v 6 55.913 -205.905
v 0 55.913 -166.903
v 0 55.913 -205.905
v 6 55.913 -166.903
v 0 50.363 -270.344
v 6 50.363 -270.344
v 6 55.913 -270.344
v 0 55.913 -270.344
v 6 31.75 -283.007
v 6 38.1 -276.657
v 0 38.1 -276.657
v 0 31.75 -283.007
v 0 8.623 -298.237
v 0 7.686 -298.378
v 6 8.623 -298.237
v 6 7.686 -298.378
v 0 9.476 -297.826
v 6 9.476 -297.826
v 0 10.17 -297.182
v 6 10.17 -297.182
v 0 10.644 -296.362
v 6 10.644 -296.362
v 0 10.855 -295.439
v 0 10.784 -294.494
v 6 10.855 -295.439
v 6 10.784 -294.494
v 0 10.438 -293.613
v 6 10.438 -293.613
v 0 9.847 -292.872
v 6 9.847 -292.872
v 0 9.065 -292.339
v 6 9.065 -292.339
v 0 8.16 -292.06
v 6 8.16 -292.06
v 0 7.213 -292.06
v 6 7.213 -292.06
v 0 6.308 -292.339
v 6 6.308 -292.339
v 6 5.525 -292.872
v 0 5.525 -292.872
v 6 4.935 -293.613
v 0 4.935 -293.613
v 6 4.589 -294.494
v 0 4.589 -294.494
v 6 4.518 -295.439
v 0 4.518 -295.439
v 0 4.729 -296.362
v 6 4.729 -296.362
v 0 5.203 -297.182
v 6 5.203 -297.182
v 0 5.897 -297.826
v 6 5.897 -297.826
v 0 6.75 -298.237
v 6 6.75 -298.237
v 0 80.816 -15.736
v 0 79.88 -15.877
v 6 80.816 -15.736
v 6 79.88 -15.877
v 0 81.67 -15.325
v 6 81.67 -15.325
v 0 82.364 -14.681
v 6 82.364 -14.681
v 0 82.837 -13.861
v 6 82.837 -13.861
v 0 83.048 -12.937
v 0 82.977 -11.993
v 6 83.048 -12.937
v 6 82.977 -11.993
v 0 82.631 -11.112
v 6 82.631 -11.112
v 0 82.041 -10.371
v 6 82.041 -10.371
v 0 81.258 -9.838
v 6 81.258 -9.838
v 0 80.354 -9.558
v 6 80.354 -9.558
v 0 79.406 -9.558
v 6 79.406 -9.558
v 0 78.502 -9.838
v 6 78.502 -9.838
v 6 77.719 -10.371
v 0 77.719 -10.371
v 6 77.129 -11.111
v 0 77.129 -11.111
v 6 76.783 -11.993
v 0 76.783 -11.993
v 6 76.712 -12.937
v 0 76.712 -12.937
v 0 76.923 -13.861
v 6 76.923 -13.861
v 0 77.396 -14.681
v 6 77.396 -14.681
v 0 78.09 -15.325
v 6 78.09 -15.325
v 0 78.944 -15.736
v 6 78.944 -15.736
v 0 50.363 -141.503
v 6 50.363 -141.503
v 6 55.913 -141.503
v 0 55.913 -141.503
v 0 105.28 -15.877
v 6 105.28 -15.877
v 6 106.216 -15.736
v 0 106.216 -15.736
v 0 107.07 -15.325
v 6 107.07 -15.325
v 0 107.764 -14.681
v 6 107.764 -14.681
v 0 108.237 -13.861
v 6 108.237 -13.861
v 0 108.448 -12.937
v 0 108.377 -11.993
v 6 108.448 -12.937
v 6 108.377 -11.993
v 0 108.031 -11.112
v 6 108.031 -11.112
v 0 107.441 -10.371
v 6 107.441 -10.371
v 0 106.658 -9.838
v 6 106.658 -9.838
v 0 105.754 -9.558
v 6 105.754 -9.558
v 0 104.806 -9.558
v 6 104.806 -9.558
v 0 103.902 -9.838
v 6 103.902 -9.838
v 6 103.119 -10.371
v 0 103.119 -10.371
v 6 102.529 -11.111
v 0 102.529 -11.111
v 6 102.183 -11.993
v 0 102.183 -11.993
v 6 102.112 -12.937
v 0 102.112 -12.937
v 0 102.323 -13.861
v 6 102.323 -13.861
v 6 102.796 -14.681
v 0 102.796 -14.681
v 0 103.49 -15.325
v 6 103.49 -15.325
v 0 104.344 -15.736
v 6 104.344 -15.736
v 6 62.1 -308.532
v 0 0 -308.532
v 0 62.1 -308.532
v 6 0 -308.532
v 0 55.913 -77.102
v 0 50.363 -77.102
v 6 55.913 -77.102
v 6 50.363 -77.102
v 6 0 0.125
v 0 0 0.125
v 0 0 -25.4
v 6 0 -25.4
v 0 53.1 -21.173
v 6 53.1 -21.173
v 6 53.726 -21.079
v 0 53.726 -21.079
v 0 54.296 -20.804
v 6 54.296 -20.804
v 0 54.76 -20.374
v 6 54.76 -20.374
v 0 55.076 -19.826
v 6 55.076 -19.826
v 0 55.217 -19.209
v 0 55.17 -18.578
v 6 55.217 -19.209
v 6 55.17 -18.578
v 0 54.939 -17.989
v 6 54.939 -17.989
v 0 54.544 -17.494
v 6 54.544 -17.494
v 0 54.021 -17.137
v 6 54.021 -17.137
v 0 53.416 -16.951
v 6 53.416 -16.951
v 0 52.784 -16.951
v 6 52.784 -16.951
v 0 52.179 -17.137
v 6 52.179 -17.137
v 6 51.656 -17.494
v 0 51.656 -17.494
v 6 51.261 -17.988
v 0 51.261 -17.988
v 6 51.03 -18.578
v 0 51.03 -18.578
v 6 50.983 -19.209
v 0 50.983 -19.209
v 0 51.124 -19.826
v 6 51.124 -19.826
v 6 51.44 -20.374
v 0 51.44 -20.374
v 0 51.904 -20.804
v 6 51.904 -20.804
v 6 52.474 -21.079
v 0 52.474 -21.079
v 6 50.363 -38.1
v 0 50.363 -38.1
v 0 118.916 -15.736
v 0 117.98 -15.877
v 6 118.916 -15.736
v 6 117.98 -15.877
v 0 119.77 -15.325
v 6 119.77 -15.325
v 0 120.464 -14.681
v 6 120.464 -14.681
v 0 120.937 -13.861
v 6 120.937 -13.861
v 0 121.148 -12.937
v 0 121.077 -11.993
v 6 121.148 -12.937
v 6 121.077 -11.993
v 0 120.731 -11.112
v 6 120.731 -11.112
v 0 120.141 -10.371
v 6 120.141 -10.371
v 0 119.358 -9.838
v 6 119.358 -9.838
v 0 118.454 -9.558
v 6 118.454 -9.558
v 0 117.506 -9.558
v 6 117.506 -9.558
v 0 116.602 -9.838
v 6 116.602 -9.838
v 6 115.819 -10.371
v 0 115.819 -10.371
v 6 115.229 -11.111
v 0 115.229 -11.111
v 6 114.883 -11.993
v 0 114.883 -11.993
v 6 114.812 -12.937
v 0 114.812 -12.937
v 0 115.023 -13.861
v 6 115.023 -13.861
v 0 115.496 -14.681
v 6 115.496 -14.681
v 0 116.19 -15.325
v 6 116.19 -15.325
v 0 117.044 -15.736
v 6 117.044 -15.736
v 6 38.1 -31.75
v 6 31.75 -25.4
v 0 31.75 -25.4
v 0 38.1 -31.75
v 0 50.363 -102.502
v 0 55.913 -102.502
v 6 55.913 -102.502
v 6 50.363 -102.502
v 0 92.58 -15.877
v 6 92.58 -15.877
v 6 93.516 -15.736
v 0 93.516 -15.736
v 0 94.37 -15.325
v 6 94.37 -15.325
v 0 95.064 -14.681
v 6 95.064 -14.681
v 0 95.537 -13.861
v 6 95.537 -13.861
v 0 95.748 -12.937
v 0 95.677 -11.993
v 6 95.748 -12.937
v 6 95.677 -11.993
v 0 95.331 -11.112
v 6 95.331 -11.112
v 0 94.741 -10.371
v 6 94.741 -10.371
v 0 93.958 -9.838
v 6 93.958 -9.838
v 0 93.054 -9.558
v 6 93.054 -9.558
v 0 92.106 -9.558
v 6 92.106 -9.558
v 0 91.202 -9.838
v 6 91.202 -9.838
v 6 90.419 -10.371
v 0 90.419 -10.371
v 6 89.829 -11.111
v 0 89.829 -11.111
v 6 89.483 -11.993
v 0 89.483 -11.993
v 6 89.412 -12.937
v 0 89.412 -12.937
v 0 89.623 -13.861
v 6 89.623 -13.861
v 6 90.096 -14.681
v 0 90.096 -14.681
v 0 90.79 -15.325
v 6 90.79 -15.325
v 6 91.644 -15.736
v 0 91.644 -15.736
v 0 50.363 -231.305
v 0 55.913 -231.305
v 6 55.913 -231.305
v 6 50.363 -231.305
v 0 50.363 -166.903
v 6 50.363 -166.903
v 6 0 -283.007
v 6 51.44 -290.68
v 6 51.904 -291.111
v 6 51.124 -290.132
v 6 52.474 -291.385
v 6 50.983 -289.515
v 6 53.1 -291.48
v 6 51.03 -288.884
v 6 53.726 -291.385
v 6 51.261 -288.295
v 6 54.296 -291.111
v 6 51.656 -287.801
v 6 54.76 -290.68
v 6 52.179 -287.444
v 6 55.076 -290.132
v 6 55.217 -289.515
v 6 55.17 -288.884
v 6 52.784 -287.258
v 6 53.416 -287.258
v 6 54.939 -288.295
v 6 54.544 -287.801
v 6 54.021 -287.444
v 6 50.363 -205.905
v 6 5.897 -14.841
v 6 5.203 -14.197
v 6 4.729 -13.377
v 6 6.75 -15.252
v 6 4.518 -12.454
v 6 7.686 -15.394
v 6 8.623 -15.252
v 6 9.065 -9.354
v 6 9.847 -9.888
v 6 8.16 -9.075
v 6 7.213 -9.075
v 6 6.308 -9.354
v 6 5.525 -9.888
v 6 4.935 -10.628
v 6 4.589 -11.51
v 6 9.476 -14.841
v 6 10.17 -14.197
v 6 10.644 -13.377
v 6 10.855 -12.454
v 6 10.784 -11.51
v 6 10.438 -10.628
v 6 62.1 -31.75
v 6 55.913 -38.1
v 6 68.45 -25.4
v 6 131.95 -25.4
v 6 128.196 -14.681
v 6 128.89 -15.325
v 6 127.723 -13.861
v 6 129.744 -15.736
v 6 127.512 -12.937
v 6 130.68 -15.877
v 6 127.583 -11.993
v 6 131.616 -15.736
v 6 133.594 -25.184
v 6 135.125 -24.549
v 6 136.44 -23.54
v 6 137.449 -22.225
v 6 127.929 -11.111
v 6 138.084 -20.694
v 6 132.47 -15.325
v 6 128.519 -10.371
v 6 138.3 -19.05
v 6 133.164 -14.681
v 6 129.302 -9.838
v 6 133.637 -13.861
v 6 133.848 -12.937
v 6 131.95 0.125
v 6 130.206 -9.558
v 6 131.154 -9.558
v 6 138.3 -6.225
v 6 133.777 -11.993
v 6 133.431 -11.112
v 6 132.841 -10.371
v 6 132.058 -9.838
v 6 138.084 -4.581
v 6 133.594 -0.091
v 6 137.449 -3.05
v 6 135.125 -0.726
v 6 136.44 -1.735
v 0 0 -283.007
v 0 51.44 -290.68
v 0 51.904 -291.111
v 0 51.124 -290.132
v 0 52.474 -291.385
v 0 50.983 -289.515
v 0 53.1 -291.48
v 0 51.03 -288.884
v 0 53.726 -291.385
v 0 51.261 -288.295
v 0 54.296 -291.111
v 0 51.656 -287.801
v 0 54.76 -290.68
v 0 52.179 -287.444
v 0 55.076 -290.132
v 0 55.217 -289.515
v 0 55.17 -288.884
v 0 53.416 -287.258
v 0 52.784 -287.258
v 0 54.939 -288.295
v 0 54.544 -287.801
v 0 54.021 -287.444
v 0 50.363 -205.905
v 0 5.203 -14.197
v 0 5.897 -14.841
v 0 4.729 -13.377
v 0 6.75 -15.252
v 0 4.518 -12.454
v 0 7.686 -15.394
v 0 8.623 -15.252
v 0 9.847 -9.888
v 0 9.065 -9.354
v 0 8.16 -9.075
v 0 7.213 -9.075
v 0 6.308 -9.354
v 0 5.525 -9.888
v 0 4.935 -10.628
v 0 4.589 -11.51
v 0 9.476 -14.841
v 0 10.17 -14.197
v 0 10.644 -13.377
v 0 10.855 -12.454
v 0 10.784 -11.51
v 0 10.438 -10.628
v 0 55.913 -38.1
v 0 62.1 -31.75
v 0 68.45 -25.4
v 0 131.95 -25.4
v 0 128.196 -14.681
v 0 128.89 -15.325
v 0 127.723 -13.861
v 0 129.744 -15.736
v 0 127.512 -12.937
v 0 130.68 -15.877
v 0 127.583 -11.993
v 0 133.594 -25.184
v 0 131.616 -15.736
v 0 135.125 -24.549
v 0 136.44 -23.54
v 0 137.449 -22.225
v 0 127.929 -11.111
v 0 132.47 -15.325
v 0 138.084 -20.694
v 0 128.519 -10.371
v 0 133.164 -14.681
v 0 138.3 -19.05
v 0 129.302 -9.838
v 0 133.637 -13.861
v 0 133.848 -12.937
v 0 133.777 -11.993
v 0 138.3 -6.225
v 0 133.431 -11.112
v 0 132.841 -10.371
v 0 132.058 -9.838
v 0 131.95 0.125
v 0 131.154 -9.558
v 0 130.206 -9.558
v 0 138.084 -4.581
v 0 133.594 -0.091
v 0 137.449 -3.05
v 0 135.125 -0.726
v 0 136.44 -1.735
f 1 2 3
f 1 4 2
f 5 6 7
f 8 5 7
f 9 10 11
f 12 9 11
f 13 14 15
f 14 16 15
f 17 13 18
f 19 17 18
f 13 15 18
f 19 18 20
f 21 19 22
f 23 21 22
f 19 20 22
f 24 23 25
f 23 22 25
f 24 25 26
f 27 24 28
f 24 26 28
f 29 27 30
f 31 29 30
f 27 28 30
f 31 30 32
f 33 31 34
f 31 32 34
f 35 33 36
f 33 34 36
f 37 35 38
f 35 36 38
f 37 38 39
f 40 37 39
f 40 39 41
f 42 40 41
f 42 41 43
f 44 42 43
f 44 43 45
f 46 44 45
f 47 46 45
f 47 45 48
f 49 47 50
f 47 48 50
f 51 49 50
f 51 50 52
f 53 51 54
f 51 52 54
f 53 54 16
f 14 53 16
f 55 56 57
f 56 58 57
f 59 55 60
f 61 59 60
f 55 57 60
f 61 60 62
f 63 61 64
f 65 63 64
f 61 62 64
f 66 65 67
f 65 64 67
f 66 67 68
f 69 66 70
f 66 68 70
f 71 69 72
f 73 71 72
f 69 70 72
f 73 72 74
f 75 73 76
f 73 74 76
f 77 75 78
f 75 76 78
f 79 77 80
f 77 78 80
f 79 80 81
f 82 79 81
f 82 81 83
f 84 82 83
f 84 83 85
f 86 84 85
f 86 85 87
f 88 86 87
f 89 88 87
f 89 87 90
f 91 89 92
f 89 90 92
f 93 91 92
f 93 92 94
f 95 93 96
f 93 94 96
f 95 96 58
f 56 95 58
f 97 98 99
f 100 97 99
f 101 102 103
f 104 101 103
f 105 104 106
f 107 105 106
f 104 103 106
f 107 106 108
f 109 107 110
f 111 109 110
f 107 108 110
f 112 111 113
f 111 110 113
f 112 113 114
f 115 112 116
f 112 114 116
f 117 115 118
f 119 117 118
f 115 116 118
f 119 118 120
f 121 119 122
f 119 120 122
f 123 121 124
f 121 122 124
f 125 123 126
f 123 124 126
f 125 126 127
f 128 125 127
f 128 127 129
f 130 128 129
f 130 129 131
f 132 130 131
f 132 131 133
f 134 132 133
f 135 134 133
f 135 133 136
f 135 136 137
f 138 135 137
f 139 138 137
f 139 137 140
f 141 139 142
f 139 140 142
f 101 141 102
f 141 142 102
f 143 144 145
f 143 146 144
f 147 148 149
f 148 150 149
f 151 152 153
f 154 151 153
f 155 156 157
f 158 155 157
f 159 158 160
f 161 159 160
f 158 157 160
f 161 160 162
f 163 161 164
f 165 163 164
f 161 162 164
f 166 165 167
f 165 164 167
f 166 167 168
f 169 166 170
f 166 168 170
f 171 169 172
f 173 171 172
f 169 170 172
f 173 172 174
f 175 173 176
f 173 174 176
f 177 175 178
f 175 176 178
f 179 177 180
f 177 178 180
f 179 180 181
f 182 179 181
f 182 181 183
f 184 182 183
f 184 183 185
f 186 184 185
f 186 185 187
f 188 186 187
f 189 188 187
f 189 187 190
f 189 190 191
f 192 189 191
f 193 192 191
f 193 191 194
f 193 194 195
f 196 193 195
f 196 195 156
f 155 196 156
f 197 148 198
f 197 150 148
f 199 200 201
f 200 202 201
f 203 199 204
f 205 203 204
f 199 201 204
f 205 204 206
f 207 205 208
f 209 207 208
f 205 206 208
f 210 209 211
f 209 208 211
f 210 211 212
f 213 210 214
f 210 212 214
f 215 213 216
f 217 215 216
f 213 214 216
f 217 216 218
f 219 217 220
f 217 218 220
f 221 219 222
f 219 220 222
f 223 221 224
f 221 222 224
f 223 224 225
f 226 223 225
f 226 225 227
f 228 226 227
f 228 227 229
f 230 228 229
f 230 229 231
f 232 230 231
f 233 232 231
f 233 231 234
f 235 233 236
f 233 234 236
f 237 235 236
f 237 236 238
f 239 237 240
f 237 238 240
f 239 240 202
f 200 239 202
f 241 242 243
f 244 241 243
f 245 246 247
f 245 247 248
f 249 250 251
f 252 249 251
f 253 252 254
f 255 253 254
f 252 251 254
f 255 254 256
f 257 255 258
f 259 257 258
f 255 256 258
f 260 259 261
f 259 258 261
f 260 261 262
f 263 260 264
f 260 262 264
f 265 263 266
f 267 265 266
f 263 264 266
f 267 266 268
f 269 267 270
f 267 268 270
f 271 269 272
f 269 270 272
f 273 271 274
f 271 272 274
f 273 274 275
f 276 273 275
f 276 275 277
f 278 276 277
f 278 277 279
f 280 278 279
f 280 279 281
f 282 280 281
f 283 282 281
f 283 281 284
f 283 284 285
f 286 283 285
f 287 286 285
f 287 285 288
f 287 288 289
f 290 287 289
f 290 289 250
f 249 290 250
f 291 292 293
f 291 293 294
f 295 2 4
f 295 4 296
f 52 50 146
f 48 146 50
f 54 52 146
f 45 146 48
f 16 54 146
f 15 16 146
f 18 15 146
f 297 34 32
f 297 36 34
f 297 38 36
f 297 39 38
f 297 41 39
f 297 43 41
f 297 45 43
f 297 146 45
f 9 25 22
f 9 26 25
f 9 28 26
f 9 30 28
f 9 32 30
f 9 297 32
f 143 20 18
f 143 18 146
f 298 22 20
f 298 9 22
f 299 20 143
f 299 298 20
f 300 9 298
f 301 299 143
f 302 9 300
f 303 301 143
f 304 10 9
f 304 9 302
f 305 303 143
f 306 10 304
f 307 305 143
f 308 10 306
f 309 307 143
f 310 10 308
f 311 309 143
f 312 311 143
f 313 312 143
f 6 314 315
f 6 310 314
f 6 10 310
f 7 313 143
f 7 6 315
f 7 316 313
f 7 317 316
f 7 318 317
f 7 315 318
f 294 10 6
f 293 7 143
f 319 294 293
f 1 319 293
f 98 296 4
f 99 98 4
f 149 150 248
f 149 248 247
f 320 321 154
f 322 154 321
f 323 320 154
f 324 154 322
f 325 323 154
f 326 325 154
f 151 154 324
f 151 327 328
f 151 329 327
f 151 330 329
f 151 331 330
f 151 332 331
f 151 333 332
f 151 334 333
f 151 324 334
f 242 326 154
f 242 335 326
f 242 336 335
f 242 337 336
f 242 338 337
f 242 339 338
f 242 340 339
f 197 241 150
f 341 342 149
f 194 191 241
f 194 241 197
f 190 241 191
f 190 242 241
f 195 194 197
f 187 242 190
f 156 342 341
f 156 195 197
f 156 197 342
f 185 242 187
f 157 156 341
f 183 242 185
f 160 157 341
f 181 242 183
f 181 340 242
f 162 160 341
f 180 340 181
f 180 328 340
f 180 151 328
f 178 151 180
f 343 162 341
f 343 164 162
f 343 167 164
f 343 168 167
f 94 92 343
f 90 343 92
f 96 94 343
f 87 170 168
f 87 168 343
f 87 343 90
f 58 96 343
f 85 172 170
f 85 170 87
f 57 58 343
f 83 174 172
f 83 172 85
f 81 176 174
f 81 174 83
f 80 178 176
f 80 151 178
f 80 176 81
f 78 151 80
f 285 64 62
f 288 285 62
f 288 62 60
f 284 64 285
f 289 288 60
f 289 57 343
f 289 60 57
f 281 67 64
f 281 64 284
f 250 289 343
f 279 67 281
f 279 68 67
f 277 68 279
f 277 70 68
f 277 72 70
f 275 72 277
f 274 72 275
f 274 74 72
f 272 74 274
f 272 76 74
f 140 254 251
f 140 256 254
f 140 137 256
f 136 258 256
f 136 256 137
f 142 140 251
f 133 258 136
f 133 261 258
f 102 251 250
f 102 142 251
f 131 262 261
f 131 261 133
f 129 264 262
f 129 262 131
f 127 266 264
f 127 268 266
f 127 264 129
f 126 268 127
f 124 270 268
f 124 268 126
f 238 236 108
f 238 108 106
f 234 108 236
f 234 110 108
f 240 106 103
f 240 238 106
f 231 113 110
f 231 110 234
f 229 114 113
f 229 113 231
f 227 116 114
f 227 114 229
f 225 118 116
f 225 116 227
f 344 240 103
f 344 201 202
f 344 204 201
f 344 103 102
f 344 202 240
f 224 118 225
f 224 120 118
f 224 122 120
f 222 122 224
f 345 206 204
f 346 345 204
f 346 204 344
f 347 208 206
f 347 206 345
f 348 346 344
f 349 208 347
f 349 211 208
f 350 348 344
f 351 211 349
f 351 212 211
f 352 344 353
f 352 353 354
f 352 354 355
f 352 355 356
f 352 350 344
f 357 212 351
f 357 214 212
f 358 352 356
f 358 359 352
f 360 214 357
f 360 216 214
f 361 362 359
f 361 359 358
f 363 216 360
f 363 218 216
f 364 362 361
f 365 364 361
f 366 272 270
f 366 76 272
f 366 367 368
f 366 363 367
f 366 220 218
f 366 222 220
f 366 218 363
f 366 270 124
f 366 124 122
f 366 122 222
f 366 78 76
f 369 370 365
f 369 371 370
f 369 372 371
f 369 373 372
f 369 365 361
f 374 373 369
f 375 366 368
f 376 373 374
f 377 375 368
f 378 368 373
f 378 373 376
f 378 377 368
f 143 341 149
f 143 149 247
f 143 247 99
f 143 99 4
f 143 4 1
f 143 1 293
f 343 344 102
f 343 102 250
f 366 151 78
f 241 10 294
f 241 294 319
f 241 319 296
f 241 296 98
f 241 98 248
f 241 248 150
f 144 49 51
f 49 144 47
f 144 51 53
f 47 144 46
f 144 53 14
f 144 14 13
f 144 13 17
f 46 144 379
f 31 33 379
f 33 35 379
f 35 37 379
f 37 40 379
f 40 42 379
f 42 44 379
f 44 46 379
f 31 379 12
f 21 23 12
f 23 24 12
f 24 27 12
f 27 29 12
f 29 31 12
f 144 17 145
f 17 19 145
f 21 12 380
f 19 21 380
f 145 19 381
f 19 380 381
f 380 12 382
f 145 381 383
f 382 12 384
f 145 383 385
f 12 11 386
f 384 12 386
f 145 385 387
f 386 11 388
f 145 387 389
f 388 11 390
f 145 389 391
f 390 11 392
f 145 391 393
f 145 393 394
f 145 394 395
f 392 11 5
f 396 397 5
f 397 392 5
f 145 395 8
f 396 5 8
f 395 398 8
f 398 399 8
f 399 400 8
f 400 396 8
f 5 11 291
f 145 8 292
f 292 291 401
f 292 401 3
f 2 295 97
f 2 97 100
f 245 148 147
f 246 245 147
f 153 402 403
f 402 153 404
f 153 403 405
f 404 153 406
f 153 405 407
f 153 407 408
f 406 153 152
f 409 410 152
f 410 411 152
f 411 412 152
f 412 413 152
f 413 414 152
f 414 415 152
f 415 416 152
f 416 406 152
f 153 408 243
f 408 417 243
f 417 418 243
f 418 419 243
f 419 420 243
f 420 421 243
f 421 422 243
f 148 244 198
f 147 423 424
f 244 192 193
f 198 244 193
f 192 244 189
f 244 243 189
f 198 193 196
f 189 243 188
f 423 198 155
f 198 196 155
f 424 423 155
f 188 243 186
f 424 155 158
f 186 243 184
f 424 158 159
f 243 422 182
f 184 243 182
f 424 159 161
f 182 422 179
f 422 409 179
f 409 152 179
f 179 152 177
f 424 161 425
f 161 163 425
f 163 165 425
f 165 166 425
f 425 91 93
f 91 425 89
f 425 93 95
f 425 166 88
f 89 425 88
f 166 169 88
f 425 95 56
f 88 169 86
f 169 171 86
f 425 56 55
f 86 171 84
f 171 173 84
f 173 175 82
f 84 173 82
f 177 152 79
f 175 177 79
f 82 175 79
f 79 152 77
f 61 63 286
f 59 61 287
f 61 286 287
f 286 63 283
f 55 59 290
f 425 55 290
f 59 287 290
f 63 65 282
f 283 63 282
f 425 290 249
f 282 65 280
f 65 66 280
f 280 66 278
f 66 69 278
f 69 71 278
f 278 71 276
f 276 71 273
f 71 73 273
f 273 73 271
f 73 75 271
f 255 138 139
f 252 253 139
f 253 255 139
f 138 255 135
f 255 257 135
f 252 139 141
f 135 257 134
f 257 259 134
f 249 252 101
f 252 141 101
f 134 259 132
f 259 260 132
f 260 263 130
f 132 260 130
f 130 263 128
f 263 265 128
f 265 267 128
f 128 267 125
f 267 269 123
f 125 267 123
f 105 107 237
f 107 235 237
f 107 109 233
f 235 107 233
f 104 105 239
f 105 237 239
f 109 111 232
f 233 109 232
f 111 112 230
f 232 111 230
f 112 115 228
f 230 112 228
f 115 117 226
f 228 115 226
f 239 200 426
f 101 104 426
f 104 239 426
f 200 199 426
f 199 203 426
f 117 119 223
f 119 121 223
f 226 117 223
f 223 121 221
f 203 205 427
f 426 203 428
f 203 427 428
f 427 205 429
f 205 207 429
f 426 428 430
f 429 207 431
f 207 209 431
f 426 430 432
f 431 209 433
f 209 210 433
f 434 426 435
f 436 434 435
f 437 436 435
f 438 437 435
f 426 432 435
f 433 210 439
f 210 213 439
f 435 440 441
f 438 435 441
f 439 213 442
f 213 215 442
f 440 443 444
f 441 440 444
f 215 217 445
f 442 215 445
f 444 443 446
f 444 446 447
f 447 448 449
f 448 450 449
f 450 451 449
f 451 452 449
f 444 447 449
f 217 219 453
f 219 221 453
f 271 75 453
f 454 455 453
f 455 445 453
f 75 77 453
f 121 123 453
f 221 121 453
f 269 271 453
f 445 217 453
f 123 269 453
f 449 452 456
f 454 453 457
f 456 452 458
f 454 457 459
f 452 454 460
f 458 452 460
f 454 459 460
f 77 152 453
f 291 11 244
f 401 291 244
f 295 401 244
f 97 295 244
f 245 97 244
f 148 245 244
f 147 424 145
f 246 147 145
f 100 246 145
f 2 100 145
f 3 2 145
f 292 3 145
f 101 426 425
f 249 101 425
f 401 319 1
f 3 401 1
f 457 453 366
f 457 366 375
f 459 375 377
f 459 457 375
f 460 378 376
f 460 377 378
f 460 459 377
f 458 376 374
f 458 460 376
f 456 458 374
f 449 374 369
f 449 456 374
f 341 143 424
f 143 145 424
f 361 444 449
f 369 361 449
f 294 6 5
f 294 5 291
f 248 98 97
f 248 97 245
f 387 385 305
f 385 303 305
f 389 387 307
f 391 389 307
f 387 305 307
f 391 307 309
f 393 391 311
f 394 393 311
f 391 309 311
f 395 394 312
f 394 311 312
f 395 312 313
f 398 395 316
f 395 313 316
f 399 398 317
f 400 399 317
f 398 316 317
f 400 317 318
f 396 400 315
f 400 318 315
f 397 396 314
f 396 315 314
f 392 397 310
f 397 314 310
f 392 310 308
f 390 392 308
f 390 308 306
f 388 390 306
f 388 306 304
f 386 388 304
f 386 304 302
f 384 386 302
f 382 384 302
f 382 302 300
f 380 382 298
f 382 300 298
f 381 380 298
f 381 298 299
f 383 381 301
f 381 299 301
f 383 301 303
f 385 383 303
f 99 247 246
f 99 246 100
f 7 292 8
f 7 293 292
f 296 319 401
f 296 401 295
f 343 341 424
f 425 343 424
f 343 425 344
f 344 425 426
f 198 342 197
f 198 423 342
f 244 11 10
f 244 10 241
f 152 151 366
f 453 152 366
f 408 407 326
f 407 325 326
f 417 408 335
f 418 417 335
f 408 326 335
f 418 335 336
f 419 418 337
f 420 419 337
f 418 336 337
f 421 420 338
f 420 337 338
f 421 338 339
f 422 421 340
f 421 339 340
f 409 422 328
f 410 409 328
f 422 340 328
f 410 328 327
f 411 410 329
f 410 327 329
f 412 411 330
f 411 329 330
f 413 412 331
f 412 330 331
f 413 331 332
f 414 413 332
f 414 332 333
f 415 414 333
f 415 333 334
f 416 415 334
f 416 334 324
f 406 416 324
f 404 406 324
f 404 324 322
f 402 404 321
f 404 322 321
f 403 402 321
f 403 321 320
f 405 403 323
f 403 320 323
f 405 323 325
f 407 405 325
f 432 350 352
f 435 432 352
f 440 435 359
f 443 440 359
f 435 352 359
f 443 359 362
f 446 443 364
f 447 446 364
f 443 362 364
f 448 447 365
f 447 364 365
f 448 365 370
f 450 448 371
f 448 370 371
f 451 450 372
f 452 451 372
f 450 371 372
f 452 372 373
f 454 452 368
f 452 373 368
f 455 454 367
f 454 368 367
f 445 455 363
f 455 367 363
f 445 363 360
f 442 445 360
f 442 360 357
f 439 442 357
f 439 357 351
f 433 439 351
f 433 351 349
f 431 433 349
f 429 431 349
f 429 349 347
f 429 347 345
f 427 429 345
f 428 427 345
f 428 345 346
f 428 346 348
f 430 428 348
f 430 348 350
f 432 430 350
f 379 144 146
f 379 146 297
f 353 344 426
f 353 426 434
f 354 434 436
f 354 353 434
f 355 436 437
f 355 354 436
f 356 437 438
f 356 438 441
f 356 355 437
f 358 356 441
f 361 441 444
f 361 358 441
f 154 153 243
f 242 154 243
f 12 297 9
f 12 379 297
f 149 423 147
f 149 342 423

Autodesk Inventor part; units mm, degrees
ref_plane "YZ Plane" through (0, 0, 0) normal (1, 0, 0) x (0, 1, 0)
ref_plane "XZ Plane" through (0, 0, 0) normal (0, 1, 0) x (-1, 0, 0)
ref_plane "XY Plane" through (0, 0, 0) normal (0, 0, 1) x (1, 0, 0)
sketch "Sketch1" plane through (0, 0, 0) normal (1, 0, 0) x (0, 1, 0)
  line L0 (0, 0) -> (0, -38.1)
  line L1 (0, -38.1) -> (38.1, -38.1)
  line L2 (0, -308.4068) -> (0, -270.3068)
  line L3 (0, -270.3068) -> (38.1, -270.3068)
  line L4 (0, -308.4068) -> (62.1, -308.4068)
  line L5 (62.1, -308.4068) -> (62.1, -25.4)
  line L6 (62.1, -25.4) -> (138.3, -25.4)
  line L7 (138.3, -25.4) -> (138.3, 0)
  line L8 (38.1, -38.1) -> (38.1, -270.3068)
  line L9 (138.3, 0) -> (0, 0)
  line L10 (56.1, -38.1) -> (50.1, -38.1)
  line L11 (50.1, -38.1) -> (50.1, -77.1017)
  line L12 (50.1, -77.1017) -> (56.1, -77.1017)
  line L13 (56.1, -77.1017) -> (56.1, -38.1)
  line L14 (56.1, -102.5017) -> (50.1, -102.5017)
  line L15 (50.1, -102.5017) -> (50.1, -141.5034)
  line L16 (50.1, -141.5034) -> (56.1, -141.5034)
  line L17 (56.1, -141.5034) -> (56.1, -102.5017)
  line L18 (56.1, -166.9034) -> (50.1, -166.9034)
  line L19 (50.1, -166.9034) -> (50.1, -205.9051)
  line L20 (50.1, -205.9051) -> (56.1, -205.9051)
  line L21 (56.1, -205.9051) -> (56.1, -166.9034)
  line L22 (56.1, -231.3051) -> (50.1, -231.3051)
  line L23 (50.1, -231.3051) -> (50.1, -270.3068)
  line L24 (50.1, -270.3068) -> (56.1, -270.3068)
  line L25 (56.1, -270.3068) -> (56.1, -231.3051)
  point P0 (0, -289.3568)
  point P1 (56.1, -57.6008)
  point P2 (56.1, -122.0026)
  point P3 (56.1, -186.4043)
  point P4 (56.1, -250.806)
  dimension "d1" = 38.1
  dimension "d2" = 38.1
  dimension "d4" = 38.1
  dimension "d5" = 24
  dimension "d6" = 76.2
  dimension "d16" = 308.4068
  dimension "d17" = 6
  dimension "d18" = 39.0017
  dimension "d21" = 6
  dimension "d22" = 39.0017
  dimension "d23" = 25.4
  dimension "d24" = 6
  dimension "d25" = 39.0017
  dimension "d26" = 25.4
  dimension "d27" = 6
  dimension "d28" = 39.0017
  dimension "d29" = 25.4
  dimension "d49" = 25.4
  dimension "d61" = 38.1
  dimension "d62" = 50.1
extrude "Extrusion1" add sketch "Sketch1" along normal blind 6
sketch "Sketch2" plane through (0, 0, 0) normal (-1, 0, 0) x (0, 0, 1)
  circle A0 centre (-12.2165, 7.6864) radius 3.175 projected
  circle A1 centre (-295.2013, 7.6864) radius 3.175 projected
  point P0 (0, 0)
sketch "Sketch3" plane through (0, 0, 0) normal (-1, 0, 0) x (0, 0, 1)
  line L0 (0, 0) -> (-38.1, 0) projected
  line L1 (-38.1, 0) -> (-25.4, 0)
  line L2 (-25.4, 0) -> (-25.4, 38.1)
  line L3 (-25.4, 38.1) -> (-38.1, 38.1)
  line L4 (-38.1, 38.1) -> (-38.1, 0)
  line L5 (-270.3068, 38.1) -> (-270.3068, 0) projected
  line L6 (-270.3068, 0) -> (-283.0068, 0)
  line L7 (-283.0068, 0) -> (-283.0068, 38.1)
  line L8 (-283.0068, 38.1) -> (-270.3068, 38.1)
  line L9 (-270.3068, 38.1) -> (-270.3068, 0)
  dimension "d37" = 12.7
  dimension "d90" = 38.1
extrude "Extrusion3" cut sketch "Sketch3" against normal through all
chamfer "Chamfer1" distance 6.35 angle 45 2 edges at (3, 38.1, -283.0068) (3, 38.1, -25.4)
chamfer "Chamfer2" distance 6.35 angle 45 1 edges at (3, 62.1, -25.4)
fillet "Fillet1" radius 6.35 2 edges at (3, 138.3, -25.4) (3, 138.3, 0)
sketch "Sketch4" plane through (6, 0, 0) normal (1, 0, 0) x (0, 0, -1)
  circle A0 centre (12.7, 130.68) radius 3.175
  line L0 (19.05, 138.3) -> (6.35, 138.3) projected
  line L1 (25.4, 68.45) -> (25.4, 131.95) projected
  circle A1 centre (12.7, 117.98) radius 3.175
  circle A2 centre (12.7, 105.28) radius 3.175
  circle A3 centre (12.7, 92.58) radius 3.175
  circle A4 centre (12.7, 79.88) radius 3.175
  point P0 (0, 0)
  point P1 (12.7, 138.3)
  dimension "d50" = 6.35
  dimension "d51" = 7.62
  dimension "d54" = 12.7
sketch "Sketch5" plane through (6, 0, 0) normal (1, 0, 0) x (0, 0, -1)
  circle A0 centre (19.05, 53.1) radius 1.6256
  circle A1 centre (289.3568, 53.1) radius 1.6256
  line L0 (0, 131.95) -> (0, 0) projected
  line L1 (308.4068, 0) -> (308.4068, 62.1) projected
  line L2 (270.3068, 56.1) -> (270.3068, 50.1) projected
  line L3 (38.1, 50.1) -> (38.1, 56.1) projected
  point P0 (270.3068, 53.1)
  point P1 (38.1, 53.1)
  dimension "d63" = 3.2512
  dimension "d64" = 3.2512
  dimension "d65" = 19.05
  dimension "d66" = 19.05
hole "Hole1" at (0, 7.6864, -12.2165) at (0, 7.6864, -295.2013) direction (1, 0, 0) diameter 6.604 depth 17.0942 tip angle 118 clearance for "Hex Head Bolt" size "M6" standard "Ansi Metric M Profile"
hole "Hole2" at (6, 79.88, -12.7) at (6, 92.58, -12.7) at (6, 105.28, -12.7) at (6, 117.98, -12.7) at (6, 130.68, -12.7) direction (-1, 0, 0) diameter 6.604 depth 17.0942 tip angle 118 clearance for "Hex Head Bolt" size "M6" standard "Ansi Metric M Profile"
hole "Hole3" at (6, 53.1, -289.3568) at (6, 53.1, -19.05) direction (-1, 0, 0) diameter 4.4958 depth 17.0942 tip angle 118 clearance for "Socket Head Cap Screw" size "M4" standard "Ansi Metric M Profile"
sketch "Sketch6" plane through (6, 0, 0) normal (1, 0, 0) x (0, 0, -1)
  line L0 (0, 0) -> (-0.125, 0)
  line L1 (-0.125, 0) -> (-0.125, 138.3)
  line L2 (-0.125, 138.3) -> (0, 138.3)
  line L3 (0, 131.95) -> (0, 0)
  line L4 (19.05, 138.3) -> (6.35, 138.3) projected
  line L5 (0, 138.3) -> (6.35, 138.3)
  arc A0 (6.35, 138.3) -> (0, 131.95) centre (6.35, 131.95) ccw projected
  line L6 (0, 131.95) -> (0, 0) projected
  line L7 (308.4068, 0) -> (308.4068, 62.1) projected
  line L8 (308.4068, 0) -> (308.5318, 0)
  line L9 (308.5318, 0) -> (308.5318, 62.1)
  line L10 (308.5318, 62.1) -> (308.4068, 62.1)
  line L11 (308.4068, 62.1) -> (308.4068, 0)
  dimension "d91" = 0.125
  dimension "d92" = 0.125
extrude "Extrusion6" add sketch "Sketch6" against normal up to surface (6 mm away)
sketch "Sketch7" plane through (6, 0, 0) normal (1, 0, 0) x (0, 0, -1)
  line L0 (38.1, 49.915) -> (77.1017, 49.915)
  line L1 (77.1017, 49.915) -> (77.1017, 56.285)
  line L2 (77.1017, 56.285) -> (38.1, 56.285)
  line L3 (38.1, 56.285) -> (38.1, 49.915)
  line L4 (102.5017, 49.915) -> (141.5034, 49.915)
  line L5 (141.5034, 49.915) -> (141.5034, 56.285)
  line L6 (141.5034, 56.285) -> (102.5017, 56.285)
  line L7 (102.5017, 56.285) -> (102.5017, 49.915)
  line L8 (166.9034, 49.915) -> (205.9051, 49.915)
  line L9 (205.9051, 49.915) -> (205.9051, 56.285)
  line L10 (205.9051, 56.285) -> (166.9034, 56.285)
  line L11 (166.9034, 56.285) -> (166.9034, 49.915)
  line L12 (231.3051, 49.915) -> (270.3442, 49.915)
  line L13 (270.3442, 49.915) -> (270.3442, 56.285)
  line L14 (270.3442, 56.285) -> (231.3051, 56.285)
  line L15 (231.3051, 56.285) -> (231.3051, 49.915)
  point P0 (0, 0)
  dimension "d95" = 6.37
  dimension "d96" = 6.37
extrude "Extrusion7" cut sketch "Sketch7" against normal through all
fillet "Fillet2" radius 6.35 1 edges at (3, 138.3, 0.125)
sketch "Sketch8" plane through (6, 0, 0) normal (1, 0, 0) x (0, 0, -1)
  circle A0 centre (19.05, 53.1) radius 2.2479 projected
  circle A1 centre (19.05, 53.1) radius 2.123
  circle A2 centre (289.3568, 53.1) radius 2.2479 projected
  circle A3 centre (289.3568, 53.1) radius 2.123
  circle A4 centre (12.2165, 7.6864) radius 3.302 projected
  circle A5 centre (12.2165, 7.6864) radius 3.177
  circle A6 centre (289.3568, 53.1) radius 8.2692
  circle A7 centre (19.05, 53.1) radius 5.3993
  circle A8 centre (12.2165, 7.6864) radius 6.0183
  circle A9 centre (295.2013, 7.6864) radius 3.302 projected
  circle A10 centre (295.2013, 7.6864) radius 3.177
  circle A11 centre (295.2013, 7.6864) radius 6.2668
  circle A12 centre (12.7, 79.88) radius 3.302 projected
  circle A13 centre (12.7, 79.88) radius 3.177
  circle A14 centre (12.7, 79.88) radius 5.8929
  circle A15 centre (12.7, 92.58) radius 3.302 projected
  circle A16 centre (12.7, 92.58) radius 3.177
  circle A17 centre (12.7, 92.58) radius 5.9761
  circle A18 centre (12.7, 105.28) radius 3.302 projected
  circle A19 centre (12.7, 105.28) radius 3.177
  circle A20 centre (12.7, 105.28) radius 5.9666
  circle A21 centre (12.7, 117.98) radius 3.302 projected
  circle A22 centre (12.7, 117.98) radius 3.177
  circle A23 centre (12.7, 117.98) radius 6.163
  circle A24 centre (12.7, 130.68) radius 6.466
  circle A25 centre (12.7, 130.68) radius 3.177
  point P0 (0, 0)
  dimension "d100" = 4.246
  dimension "d101" = 4.246
  dimension "d102" = 6.354
  dimension "d103" = 6.354
  dimension "d104" = 6.354
  dimension "d105" = 6.354
  dimension "d106" = 6.354
  dimension "d107" = 6.354
  dimension "d108" = 6.354
extrude "Extrusion8" add sketch "Sketch8" against normal up to surface (6 mm away) contours A0 | A2 | A4 | A6 | A7 | A8 | A9 | A11 | A12 | A14 | A15 | A17 | A18 | A20 | A21 | A23 | A24
sketch "Sketch9" plane through (6, 0, 0) normal (1, 0, 0) x (0, 0, -1)
  line L0 (38.1, 55.9132) -> (77.1017, 55.9132)
  line L1 (77.1017, 55.9132) -> (77.1017, 50.3632)
  line L2 (77.1017, 50.3632) -> (38.1, 50.3632)
  line L3 (38.1, 50.3632) -> (38.1, 55.9132)
  line L4 (102.5017, 55.9132) -> (141.5034, 55.9132)
  line L5 (141.5034, 55.9132) -> (141.5034, 50.3632)
  line L6 (141.5034, 50.3632) -> (102.5017, 50.3632)
  line L7 (102.5017, 50.3632) -> (102.5017, 55.9132)
  line L8 (166.9034, 55.9132) -> (205.9051, 55.9132)
  line L9 (205.9051, 55.9132) -> (205.9051, 50.3632)
  line L10 (205.9051, 50.3632) -> (166.9034, 50.3632)
  line L11 (166.9034, 50.3632) -> (166.9034, 55.9132)
  line L12 (231.3051, 55.9132) -> (270.3442, 55.9132)
  line L13 (270.3442, 55.9132) -> (270.3442, 50.3632)
  line L14 (270.3442, 50.3632) -> (231.3051, 50.3632)
  line L15 (231.3051, 50.3632) -> (231.3051, 55.9132)
  line L16 (77.1017, 56.285) -> (77.1017, 49.915) projected
  line L17 (38.1, 49.915) -> (38.1, 56.285) projected
  line L18 (102.5017, 49.915) -> (102.5017, 56.285) projected
  line L19 (141.5034, 56.285) -> (141.5034, 49.915) projected
  line L20 (166.9034, 49.915) -> (166.9034, 56.285) projected
  line L21 (205.9051, 56.285) -> (205.9051, 49.915) projected
  line L22 (231.3051, 49.915) -> (231.3051, 56.285) projected
  line L23 (270.3442, 56.285) -> (270.3442, 49.915) projected
  circle A0 centre (12.7, 79.88) radius 3.177 projected
  circle A1 centre (12.2165, 7.6864) radius 3.177 projected
  circle A2 centre (12.7, 105.28) radius 3.177 projected
  circle A3 centre (295.2013, 7.6864) radius 3.177 projected
  circle A4 centre (12.7, 117.98) radius 3.177 projected
  circle A5 centre (19.05, 53.1) radius 2.123 projected
  circle A6 centre (12.7, 92.58) radius 3.177 projected
  circle A7 centre (289.3568, 53.1) radius 2.123 projected
  circle A8 centre (12.7, 130.68) radius 3.177 projected
  line L24 (231.3051, 49.915) -> (231.3051, 56.285) projected
  line L25 (231.3051, 56.285) -> (270.3442, 56.285) projected
  line L26 (270.3442, 56.285) -> (270.3442, 49.915) projected
  line L27 (270.3442, 49.915) -> (231.3051, 49.915) projected
  arc A9 (6.225, 138.3) -> (-0.125, 131.95) centre (6.225, 131.95) ccw projected
  line L28 (-0.125, 131.95) -> (-0.125, 0) projected
  line L29 (-0.125, 0) -> (25.4, 0) projected
  line L30 (25.4, 0) -> (25.4, 31.75) projected
  line L31 (31.75, 38.1) -> (25.4, 31.75) projected
  line L32 (31.75, 38.1) -> (276.6568, 38.1) projected
  line L33 (283.0068, 31.75) -> (276.6568, 38.1) projected
  line L34 (283.0068, 31.75) -> (283.0068, 0) projected
  line L35 (283.0068, 0) -> (308.5318, 0) projected
  line L36 (308.5318, 0) -> (308.5318, 62.1) projected
  line L37 (308.5318, 62.1) -> (31.75, 62.1) projected
  line L38 (25.4, 68.45) -> (31.75, 62.1) projected
  line L39 (25.4, 68.45) -> (25.4, 131.95) projected
  arc A10 (25.4, 131.95) -> (19.05, 138.3) centre (19.05, 131.95) ccw projected
  line L40 (19.05, 138.3) -> (6.225, 138.3) projected
  line L41 (77.1017, 56.285) -> (77.1017, 49.915) projected
  line L42 (77.1017, 49.915) -> (38.1, 49.915) projected
  line L43 (38.1, 49.915) -> (38.1, 56.285) projected
  line L44 (38.1, 56.285) -> (77.1017, 56.285) projected
  line L45 (205.9051, 56.285) -> (205.9051, 49.915) projected
  line L46 (205.9051, 49.915) -> (166.9034, 49.915) projected
  line L47 (166.9034, 49.915) -> (166.9034, 56.285) projected
  line L48 (166.9034, 56.285) -> (205.9051, 56.285) projected
  line L49 (141.5034, 56.285) -> (141.5034, 49.915) projected
  line L50 (141.5034, 49.915) -> (102.5017, 49.915) projected
  line L51 (102.5017, 49.915) -> (102.5017, 56.285) projected
  line L52 (102.5017, 56.285) -> (141.5034, 56.285) projected
  point P0 (0, 0)
  dimension "d111" = 5.55
  dimension "d112" = 0
  dimension "d113" = 0
  dimension "d114" = 0
  dimension "d115" = 0
  dimension "d116" = 0
  dimension "d117" = 0
  dimension "d118" = 0
  dimension "d119" = 0
extrude "Extrusion9" add sketch "Sketch9" against normal blind 6 contours L17 L44 L16 L0 | L2 L16 L42 L17 | L18 L52 L19 L4 | L6 L19 L50 L18 | L20 L48 L21 L8 | L10 L21 L46 L20 | L22 L25 L23 L12 | L14 L23 L27 L22
equation "\"d108\" = d107"
properties part number "V3 Mounting Wall"
